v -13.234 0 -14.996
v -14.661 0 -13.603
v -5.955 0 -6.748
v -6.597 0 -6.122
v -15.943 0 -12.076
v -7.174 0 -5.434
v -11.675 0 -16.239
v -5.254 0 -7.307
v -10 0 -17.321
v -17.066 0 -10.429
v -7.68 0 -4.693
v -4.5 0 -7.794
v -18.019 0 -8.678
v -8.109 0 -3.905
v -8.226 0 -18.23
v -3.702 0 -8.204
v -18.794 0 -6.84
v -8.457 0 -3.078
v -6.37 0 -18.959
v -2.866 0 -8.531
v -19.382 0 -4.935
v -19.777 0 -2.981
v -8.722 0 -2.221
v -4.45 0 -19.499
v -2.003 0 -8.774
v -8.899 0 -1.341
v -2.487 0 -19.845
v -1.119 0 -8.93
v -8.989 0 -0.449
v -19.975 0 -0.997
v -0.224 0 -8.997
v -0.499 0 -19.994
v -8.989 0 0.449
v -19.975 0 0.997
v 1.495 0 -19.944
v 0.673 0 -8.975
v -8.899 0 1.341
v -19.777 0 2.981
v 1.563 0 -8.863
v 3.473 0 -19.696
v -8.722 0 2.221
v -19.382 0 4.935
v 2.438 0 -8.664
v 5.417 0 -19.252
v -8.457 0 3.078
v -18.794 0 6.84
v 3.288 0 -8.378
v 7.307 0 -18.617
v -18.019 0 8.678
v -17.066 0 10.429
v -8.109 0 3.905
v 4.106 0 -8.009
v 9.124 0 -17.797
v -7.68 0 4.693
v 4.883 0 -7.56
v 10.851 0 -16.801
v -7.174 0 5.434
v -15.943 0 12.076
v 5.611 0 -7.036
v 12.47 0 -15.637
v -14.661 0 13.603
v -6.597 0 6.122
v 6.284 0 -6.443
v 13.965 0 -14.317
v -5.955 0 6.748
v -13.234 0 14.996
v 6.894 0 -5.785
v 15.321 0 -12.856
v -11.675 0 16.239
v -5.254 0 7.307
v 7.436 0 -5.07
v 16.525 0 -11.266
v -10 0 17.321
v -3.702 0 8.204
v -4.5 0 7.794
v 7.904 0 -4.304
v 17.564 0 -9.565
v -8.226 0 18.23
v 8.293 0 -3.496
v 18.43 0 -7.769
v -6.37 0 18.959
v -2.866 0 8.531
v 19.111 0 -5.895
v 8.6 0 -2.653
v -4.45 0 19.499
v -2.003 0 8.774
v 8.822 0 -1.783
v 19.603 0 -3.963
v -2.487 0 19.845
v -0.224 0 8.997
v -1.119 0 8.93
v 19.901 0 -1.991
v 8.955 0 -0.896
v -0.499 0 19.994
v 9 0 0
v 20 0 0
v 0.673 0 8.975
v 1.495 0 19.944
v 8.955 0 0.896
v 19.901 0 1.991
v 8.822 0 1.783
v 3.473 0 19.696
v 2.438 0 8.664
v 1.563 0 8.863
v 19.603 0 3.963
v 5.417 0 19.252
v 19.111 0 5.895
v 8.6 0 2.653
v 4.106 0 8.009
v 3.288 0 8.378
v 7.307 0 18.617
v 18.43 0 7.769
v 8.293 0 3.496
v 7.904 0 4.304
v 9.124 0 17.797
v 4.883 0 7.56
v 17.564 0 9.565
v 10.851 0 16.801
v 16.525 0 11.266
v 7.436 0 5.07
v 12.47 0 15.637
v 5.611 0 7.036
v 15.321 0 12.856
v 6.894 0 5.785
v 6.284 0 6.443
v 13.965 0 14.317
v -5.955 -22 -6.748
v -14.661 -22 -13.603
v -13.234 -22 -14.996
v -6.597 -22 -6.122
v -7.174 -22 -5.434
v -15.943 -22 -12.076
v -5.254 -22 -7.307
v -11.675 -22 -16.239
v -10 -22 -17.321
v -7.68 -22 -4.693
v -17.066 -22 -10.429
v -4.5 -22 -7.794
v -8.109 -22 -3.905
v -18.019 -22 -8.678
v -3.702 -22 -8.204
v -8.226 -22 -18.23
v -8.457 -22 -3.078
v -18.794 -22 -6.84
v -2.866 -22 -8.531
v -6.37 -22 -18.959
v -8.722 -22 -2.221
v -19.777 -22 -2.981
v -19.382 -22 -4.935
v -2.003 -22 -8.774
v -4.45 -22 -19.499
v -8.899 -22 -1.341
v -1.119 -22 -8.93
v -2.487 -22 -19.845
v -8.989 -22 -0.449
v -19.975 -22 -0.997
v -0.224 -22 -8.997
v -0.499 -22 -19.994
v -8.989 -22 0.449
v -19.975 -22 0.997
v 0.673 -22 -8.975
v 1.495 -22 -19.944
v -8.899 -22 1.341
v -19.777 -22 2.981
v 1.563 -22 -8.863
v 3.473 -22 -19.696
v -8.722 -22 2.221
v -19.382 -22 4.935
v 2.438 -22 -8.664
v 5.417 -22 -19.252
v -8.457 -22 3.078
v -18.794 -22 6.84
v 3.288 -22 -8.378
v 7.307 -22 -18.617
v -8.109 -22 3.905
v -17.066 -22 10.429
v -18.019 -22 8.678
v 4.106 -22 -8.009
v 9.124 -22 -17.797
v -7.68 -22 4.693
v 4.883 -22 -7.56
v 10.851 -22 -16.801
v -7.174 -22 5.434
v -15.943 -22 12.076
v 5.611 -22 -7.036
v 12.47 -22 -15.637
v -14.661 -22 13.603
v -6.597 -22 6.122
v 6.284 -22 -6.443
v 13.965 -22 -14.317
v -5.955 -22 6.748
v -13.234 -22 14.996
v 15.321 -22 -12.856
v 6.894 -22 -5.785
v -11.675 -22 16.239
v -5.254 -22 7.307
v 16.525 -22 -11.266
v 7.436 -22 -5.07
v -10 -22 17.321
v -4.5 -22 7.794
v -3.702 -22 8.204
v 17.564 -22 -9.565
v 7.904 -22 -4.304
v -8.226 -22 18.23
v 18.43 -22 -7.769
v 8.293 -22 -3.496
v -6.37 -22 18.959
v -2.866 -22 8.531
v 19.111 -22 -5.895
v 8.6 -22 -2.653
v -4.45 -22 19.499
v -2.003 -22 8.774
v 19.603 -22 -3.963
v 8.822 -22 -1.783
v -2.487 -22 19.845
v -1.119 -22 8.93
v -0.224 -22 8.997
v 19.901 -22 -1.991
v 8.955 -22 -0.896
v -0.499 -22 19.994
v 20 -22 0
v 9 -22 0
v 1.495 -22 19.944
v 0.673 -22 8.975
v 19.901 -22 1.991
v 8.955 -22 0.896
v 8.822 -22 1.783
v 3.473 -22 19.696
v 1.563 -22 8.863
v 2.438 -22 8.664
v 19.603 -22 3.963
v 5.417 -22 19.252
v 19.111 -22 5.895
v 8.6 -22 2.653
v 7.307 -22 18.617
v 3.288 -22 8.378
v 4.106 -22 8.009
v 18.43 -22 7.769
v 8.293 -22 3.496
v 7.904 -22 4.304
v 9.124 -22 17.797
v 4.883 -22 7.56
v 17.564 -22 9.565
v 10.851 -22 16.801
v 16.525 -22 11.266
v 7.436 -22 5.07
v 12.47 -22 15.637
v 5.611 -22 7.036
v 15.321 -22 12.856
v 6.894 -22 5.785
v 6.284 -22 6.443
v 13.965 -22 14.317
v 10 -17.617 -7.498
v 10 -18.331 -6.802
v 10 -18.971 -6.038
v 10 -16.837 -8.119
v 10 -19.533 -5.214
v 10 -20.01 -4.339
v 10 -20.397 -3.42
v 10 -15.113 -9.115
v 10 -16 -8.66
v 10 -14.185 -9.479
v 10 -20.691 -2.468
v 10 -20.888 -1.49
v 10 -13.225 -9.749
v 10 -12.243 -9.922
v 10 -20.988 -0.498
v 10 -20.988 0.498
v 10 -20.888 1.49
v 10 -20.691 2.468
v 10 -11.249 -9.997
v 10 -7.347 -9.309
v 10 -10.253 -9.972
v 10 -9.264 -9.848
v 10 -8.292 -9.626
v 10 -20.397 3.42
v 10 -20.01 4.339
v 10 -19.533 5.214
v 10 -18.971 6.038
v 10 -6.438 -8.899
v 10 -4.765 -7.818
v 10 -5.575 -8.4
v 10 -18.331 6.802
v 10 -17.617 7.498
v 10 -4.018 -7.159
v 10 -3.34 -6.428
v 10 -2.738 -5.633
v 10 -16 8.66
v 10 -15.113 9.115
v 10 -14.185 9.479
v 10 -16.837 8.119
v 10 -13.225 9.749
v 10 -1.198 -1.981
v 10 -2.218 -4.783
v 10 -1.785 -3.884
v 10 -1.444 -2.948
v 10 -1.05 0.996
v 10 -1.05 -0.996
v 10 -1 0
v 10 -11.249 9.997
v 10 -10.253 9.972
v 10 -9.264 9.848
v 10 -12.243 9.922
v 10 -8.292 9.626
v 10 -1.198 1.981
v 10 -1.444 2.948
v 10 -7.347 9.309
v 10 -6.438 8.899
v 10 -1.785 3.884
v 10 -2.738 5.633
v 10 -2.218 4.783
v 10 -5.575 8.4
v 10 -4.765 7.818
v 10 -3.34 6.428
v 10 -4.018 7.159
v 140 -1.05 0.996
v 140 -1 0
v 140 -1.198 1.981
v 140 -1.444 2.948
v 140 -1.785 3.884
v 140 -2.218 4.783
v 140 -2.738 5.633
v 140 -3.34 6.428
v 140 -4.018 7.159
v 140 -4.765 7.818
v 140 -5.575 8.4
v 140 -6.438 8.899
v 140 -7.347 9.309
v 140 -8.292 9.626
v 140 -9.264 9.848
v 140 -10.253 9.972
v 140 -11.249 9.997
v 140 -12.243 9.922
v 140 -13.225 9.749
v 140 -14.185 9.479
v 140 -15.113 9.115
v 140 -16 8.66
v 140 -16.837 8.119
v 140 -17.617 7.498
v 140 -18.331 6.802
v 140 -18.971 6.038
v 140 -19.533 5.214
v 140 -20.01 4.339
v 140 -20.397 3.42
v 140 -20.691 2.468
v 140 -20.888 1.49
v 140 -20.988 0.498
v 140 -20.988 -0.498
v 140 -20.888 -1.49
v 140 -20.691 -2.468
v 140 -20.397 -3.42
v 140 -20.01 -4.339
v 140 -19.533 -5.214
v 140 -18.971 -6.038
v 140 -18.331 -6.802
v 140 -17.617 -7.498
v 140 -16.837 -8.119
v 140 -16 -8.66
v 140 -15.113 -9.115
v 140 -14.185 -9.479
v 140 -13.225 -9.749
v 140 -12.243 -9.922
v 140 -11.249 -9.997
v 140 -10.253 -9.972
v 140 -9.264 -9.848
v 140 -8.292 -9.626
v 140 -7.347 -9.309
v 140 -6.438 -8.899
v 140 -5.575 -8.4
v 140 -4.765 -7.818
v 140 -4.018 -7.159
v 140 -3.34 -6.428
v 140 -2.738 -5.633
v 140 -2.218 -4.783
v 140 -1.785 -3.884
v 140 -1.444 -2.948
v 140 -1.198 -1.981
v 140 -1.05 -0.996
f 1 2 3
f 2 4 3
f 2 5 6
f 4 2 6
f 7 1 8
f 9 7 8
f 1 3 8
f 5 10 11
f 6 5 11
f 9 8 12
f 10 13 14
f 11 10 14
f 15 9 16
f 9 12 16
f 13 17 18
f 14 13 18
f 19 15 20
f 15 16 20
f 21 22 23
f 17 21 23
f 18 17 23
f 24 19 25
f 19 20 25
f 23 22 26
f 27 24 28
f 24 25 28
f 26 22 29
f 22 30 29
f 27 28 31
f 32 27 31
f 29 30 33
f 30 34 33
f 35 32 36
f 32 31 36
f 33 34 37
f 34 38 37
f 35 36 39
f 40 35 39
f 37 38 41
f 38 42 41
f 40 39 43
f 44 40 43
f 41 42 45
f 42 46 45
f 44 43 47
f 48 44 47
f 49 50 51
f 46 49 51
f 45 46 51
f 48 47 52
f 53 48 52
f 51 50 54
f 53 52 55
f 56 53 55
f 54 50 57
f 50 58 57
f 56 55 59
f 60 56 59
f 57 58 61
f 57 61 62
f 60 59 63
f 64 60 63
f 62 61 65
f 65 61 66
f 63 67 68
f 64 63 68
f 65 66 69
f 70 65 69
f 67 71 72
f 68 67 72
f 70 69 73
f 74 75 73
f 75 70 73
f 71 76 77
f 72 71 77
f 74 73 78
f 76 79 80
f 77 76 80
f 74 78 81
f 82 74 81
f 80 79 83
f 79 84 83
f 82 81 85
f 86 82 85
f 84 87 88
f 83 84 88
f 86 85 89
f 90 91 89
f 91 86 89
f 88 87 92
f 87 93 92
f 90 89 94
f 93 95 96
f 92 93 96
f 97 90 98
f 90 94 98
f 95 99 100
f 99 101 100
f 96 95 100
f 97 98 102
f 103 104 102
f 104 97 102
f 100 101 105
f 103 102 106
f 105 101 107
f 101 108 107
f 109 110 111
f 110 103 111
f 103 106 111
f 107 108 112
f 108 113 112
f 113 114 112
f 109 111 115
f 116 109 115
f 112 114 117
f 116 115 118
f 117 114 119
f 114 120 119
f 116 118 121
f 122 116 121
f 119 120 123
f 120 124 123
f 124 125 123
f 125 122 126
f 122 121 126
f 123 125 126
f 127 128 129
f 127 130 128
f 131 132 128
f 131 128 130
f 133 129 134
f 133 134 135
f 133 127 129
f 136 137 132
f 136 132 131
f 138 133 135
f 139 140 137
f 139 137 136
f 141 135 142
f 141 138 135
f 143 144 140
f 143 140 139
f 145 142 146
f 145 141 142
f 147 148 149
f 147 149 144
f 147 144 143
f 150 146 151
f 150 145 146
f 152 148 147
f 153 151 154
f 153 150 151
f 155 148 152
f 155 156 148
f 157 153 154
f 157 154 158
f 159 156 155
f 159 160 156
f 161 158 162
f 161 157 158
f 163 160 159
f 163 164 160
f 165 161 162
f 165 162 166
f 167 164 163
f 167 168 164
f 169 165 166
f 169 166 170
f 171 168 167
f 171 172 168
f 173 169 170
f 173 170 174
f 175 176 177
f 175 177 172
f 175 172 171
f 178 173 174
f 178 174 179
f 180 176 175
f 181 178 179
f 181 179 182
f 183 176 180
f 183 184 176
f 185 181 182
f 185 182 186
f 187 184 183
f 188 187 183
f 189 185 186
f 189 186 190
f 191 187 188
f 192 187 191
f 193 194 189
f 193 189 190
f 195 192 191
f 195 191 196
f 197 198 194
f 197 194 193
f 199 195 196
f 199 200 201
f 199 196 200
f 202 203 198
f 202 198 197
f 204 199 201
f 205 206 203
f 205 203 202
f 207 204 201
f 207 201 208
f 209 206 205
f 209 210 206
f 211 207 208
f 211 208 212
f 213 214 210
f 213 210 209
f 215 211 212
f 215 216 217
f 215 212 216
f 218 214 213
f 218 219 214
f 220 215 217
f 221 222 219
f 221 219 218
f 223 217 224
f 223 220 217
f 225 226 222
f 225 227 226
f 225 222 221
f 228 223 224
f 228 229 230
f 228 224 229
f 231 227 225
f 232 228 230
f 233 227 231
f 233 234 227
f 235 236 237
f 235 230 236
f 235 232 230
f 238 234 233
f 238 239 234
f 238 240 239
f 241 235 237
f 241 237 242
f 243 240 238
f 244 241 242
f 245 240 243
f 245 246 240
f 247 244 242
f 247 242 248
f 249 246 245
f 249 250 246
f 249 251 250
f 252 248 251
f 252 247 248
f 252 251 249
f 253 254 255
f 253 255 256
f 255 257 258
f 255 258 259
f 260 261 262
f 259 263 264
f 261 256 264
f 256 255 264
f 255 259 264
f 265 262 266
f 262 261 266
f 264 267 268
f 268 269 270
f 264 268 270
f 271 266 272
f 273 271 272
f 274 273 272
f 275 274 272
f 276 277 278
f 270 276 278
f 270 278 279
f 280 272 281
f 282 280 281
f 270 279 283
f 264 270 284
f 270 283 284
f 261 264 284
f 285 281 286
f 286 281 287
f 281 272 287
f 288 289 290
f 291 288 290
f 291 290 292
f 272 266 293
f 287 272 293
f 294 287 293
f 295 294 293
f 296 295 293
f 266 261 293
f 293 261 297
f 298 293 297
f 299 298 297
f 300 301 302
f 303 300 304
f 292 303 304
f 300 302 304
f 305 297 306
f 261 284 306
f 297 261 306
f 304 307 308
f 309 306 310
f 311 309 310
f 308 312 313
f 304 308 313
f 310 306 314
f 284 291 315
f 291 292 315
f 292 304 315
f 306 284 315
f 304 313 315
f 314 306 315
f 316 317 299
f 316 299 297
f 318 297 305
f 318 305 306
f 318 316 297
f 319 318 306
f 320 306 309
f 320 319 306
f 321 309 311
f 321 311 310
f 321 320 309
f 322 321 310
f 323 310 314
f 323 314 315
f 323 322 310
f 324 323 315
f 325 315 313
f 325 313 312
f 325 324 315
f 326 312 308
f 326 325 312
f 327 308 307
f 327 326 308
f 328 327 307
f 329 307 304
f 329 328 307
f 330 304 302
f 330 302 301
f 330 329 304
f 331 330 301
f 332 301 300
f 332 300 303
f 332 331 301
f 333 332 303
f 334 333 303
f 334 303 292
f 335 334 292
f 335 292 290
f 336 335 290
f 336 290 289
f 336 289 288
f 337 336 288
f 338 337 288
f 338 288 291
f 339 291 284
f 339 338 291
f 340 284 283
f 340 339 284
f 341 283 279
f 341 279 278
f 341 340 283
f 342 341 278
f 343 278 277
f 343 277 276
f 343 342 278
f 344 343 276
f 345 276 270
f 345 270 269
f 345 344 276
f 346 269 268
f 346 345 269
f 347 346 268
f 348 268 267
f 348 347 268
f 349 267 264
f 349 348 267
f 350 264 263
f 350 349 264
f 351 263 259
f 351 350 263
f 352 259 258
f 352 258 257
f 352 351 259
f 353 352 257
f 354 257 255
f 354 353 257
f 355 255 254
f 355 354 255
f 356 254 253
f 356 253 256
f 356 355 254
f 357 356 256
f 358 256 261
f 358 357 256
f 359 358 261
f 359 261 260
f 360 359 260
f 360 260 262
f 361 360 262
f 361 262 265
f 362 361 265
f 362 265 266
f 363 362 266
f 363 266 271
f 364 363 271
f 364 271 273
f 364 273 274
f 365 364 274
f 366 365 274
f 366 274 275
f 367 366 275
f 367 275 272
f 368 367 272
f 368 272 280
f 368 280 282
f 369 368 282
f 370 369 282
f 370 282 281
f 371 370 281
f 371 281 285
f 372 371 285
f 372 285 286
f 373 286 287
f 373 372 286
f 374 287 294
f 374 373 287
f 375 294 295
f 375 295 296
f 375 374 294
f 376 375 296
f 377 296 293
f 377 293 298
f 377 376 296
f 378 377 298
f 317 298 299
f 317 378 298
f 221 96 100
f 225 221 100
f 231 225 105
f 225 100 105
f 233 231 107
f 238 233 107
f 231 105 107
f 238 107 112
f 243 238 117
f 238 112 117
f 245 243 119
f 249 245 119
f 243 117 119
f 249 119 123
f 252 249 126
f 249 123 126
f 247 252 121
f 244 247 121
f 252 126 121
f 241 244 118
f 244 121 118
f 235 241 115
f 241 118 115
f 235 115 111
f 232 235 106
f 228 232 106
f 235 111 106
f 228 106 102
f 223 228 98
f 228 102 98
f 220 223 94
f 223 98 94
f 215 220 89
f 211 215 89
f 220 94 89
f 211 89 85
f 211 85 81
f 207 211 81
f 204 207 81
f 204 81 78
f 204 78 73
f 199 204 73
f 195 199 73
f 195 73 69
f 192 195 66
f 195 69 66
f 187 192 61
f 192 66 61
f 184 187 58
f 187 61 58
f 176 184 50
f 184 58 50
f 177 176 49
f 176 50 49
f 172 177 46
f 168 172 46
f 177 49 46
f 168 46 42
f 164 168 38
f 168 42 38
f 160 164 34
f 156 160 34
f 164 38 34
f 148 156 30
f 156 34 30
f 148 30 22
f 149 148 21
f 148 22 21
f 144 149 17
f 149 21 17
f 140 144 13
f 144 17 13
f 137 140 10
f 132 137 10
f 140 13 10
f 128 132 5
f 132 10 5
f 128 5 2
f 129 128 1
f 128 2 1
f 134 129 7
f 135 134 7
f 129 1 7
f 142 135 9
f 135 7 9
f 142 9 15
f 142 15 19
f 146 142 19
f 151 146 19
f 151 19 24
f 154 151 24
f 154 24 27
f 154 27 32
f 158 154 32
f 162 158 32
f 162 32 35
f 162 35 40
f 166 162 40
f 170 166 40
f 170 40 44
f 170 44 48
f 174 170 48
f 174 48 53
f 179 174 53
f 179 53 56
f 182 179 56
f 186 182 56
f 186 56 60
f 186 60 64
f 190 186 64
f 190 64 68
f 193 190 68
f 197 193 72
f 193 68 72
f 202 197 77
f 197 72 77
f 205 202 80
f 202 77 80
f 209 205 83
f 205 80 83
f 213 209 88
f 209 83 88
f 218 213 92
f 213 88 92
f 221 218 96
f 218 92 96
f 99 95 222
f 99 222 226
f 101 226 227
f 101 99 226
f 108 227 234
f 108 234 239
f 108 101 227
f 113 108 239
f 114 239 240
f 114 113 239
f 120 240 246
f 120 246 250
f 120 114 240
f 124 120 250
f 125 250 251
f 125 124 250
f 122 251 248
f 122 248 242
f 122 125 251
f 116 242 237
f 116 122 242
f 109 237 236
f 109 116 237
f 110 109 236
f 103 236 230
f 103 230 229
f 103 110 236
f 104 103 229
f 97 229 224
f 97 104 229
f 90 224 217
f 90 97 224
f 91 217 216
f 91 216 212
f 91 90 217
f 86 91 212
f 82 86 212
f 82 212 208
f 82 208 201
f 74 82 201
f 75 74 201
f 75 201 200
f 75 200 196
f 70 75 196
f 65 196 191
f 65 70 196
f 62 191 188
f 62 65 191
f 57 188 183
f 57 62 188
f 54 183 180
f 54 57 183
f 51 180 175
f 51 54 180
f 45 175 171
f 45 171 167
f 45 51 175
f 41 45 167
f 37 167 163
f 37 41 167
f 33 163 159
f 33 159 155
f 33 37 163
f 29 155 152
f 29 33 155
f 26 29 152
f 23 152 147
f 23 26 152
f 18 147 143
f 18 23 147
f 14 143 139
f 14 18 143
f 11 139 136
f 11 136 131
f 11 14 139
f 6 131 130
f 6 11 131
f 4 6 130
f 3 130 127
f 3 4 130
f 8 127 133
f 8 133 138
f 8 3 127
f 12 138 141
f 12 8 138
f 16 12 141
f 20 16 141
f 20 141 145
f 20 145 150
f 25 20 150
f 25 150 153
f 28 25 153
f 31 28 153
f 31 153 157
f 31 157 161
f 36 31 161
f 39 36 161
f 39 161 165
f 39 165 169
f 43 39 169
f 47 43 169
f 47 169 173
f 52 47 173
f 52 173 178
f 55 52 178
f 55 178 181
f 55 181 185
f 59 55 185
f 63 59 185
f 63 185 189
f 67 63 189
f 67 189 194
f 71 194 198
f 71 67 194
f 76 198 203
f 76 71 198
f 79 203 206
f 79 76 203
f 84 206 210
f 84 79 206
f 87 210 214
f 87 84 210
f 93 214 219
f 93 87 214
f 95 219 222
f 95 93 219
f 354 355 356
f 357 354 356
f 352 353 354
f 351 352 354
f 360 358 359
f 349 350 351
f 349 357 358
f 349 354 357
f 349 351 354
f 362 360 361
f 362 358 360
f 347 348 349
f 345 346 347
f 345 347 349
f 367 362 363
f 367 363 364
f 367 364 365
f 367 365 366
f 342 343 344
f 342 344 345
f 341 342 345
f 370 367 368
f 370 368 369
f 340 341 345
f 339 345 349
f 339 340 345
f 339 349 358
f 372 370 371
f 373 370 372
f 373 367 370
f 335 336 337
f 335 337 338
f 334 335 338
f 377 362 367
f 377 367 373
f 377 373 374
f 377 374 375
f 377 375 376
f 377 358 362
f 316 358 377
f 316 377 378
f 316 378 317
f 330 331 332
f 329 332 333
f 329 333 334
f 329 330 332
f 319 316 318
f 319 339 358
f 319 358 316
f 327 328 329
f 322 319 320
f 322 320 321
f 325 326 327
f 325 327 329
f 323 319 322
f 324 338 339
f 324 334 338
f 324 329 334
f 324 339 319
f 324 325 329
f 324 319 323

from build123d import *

# Parameters (mm, degrees)
F0_R     = 20
F0_R_2   = 9
F1_DEPTH = 22
F3_R     = 10
F4_DEPTH = 130


with BuildPart() as f1:
    # F0 (on Front) → F1 (new body)
    with BuildSketch(Plane.XZ):
        Circle(F0_R)
        Circle(F0_R_2, mode=Mode.SUBTRACT)
    extrude(amount=F1_DEPTH)


with BuildPart() as f4:
    # F3 (on offset) → F4 (new body)
    with BuildSketch(Plane.YZ.offset(140)):
        with Locations((-11, 0)):
            Circle(F3_R)
    extrude(amount=-F4_DEPTH)


solid = Compound([f1.part, f4.part])
